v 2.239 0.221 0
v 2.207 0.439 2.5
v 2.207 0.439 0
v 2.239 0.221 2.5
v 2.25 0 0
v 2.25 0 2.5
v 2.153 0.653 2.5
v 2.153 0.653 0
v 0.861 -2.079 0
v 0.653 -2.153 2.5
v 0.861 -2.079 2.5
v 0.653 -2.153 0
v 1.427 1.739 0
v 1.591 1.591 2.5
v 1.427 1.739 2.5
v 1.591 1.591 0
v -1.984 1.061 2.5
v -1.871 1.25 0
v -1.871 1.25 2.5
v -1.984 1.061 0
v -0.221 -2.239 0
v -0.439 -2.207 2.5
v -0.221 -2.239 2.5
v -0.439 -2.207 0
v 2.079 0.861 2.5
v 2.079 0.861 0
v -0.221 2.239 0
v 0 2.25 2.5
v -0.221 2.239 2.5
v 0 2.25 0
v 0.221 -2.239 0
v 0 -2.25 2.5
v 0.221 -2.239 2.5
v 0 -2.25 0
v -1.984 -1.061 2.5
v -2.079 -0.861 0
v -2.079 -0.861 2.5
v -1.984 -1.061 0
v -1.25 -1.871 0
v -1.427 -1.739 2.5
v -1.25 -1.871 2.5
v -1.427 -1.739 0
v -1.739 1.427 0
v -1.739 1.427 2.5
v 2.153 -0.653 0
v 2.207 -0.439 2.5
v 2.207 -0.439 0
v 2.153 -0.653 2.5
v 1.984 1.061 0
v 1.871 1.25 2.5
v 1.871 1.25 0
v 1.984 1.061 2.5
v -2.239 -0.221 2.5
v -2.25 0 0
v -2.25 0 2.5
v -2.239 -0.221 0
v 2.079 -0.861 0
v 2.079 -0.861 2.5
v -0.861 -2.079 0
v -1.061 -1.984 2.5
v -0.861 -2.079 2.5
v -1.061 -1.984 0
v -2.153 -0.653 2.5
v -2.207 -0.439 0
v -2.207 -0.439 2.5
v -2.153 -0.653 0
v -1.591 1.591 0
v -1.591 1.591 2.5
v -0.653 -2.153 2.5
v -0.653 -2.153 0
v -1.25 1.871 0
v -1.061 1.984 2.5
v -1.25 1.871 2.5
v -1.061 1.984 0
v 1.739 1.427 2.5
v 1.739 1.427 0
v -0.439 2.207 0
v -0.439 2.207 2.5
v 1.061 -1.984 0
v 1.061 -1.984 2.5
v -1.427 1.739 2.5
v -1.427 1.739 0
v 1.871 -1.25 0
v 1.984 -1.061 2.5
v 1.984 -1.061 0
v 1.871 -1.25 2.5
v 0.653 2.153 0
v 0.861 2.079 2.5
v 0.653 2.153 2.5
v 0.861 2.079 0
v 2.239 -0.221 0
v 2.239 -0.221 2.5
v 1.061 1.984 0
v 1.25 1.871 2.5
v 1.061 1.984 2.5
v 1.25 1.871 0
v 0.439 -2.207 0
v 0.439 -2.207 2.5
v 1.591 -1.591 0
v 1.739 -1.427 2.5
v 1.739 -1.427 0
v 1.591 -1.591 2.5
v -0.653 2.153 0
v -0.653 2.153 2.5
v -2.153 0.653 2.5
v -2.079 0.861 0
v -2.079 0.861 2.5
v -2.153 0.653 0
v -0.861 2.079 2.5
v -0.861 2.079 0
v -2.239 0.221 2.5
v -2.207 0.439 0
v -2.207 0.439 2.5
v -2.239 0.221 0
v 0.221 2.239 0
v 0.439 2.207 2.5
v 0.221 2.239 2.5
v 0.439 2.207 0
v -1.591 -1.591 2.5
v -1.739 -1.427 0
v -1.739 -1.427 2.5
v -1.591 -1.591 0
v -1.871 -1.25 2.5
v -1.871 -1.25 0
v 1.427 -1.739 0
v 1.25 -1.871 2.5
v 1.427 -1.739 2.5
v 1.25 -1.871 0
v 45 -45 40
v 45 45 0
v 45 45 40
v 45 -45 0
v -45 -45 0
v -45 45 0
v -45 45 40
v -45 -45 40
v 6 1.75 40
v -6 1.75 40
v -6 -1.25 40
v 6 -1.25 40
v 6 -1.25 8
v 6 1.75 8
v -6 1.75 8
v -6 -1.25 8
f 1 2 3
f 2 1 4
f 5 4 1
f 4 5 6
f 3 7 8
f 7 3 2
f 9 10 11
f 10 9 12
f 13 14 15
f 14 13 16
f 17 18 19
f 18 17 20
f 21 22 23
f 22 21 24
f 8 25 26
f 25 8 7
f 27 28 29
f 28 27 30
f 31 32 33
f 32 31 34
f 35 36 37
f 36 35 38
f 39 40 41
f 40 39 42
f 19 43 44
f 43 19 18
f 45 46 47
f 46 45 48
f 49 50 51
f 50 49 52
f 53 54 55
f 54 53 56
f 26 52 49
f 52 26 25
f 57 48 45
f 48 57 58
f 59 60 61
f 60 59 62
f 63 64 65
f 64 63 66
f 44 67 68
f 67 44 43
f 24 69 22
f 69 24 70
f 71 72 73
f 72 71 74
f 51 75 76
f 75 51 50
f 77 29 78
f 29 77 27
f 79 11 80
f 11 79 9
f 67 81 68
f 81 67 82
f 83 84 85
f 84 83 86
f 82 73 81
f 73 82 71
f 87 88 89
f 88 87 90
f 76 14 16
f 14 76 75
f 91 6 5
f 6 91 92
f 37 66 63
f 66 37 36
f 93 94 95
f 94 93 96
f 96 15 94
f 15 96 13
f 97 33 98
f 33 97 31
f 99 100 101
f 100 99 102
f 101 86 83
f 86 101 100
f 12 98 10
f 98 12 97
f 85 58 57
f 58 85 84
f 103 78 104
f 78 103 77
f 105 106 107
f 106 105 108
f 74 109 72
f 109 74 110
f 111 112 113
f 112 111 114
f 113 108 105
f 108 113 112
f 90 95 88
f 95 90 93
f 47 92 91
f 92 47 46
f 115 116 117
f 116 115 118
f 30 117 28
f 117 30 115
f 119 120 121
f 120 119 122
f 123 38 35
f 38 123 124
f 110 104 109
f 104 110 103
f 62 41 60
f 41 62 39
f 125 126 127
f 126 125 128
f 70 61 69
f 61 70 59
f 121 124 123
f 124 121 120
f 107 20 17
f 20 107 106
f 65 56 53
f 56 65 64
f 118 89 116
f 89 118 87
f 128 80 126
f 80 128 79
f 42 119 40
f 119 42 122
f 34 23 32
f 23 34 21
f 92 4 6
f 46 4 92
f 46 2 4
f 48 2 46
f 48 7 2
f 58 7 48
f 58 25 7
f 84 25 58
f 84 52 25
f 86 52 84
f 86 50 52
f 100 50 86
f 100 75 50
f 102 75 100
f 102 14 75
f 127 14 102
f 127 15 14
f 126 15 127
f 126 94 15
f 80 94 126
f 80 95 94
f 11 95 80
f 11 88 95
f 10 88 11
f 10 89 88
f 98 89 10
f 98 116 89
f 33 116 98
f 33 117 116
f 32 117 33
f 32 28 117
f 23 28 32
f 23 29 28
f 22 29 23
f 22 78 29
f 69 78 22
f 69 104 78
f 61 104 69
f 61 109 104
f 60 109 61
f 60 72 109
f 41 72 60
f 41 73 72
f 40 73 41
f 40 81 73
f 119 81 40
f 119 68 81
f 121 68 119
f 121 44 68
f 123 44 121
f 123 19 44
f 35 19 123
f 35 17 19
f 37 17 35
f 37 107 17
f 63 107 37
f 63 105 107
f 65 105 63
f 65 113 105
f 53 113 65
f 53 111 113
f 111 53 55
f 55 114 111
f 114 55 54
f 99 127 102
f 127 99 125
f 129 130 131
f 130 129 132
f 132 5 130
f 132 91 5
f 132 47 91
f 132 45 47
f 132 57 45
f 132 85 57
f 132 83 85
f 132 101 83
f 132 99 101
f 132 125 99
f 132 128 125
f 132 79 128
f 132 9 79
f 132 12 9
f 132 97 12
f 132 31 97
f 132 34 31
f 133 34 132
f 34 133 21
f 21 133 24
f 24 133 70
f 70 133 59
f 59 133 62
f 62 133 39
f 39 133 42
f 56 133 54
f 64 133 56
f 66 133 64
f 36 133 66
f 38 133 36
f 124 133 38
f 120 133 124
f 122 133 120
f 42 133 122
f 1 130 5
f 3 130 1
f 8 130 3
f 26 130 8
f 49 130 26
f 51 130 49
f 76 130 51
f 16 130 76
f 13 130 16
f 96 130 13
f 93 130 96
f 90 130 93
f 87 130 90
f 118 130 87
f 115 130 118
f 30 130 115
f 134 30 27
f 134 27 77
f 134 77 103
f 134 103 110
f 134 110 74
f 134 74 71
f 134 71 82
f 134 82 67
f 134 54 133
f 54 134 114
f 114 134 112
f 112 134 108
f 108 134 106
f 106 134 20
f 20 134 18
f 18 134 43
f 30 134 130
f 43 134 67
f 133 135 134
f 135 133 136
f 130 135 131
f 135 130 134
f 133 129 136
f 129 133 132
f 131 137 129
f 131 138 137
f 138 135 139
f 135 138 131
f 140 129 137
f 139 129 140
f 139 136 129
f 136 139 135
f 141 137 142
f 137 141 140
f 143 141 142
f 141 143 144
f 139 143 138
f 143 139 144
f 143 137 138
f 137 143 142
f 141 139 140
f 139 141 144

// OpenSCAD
// Magnetic stirrer housing - open box covering an 80 mm PC case fan
// Print orientation: top plate on bed (z = 0 to 2), walls rise to z = 40

// ---- Dimensions (mm) ----
plate_t      = 2;     // top plate thickness
wall_t       = 2.5;    // wall thickness
outer_x      = 90;     // outer size in X
outer_y      = 90;     // outer size in Y
open_top_z   = 40;     // height of open top
notch_w      = 12;     // cable notch width
notch_bottom = 8;      // notch starts here (bottom of notch)
notch_top    = open_top_z; // notch reaches the open edge
screw       = 4.5;     // M4 screw hole diameter
screw_pitch = 71.5;    // square diagonal between screw centres
eps          = 0.5;    // cutter overshoot

$fn = 64;

difference() {
    // Solid block
    translate([-outer_x/2, -outer_y/2, 0])
        cube([outer_x, outer_y, open_top_z + wall_t]);

    // Open top (hollow above z = open_top_z)
    translate([-outer_x/2, -outer_y/2, open_top_z])
        cube([outer_x, outer_y, wall_t + eps]);

    // Screw holes in top plate
    for (i = [0:3]) {
        rotate([0, 0, i * 90])
            translate([0, 0, -eps])
                cylinder(d = screw, h = plate_t + 2*eps);
    }

    // Cable notch in one wall
    translate([-notch_w/2, -wall_t/2, notch_bottom])
        cube([notch_w, wall_t + eps, notch_top - notch_bottom + eps]);
}
